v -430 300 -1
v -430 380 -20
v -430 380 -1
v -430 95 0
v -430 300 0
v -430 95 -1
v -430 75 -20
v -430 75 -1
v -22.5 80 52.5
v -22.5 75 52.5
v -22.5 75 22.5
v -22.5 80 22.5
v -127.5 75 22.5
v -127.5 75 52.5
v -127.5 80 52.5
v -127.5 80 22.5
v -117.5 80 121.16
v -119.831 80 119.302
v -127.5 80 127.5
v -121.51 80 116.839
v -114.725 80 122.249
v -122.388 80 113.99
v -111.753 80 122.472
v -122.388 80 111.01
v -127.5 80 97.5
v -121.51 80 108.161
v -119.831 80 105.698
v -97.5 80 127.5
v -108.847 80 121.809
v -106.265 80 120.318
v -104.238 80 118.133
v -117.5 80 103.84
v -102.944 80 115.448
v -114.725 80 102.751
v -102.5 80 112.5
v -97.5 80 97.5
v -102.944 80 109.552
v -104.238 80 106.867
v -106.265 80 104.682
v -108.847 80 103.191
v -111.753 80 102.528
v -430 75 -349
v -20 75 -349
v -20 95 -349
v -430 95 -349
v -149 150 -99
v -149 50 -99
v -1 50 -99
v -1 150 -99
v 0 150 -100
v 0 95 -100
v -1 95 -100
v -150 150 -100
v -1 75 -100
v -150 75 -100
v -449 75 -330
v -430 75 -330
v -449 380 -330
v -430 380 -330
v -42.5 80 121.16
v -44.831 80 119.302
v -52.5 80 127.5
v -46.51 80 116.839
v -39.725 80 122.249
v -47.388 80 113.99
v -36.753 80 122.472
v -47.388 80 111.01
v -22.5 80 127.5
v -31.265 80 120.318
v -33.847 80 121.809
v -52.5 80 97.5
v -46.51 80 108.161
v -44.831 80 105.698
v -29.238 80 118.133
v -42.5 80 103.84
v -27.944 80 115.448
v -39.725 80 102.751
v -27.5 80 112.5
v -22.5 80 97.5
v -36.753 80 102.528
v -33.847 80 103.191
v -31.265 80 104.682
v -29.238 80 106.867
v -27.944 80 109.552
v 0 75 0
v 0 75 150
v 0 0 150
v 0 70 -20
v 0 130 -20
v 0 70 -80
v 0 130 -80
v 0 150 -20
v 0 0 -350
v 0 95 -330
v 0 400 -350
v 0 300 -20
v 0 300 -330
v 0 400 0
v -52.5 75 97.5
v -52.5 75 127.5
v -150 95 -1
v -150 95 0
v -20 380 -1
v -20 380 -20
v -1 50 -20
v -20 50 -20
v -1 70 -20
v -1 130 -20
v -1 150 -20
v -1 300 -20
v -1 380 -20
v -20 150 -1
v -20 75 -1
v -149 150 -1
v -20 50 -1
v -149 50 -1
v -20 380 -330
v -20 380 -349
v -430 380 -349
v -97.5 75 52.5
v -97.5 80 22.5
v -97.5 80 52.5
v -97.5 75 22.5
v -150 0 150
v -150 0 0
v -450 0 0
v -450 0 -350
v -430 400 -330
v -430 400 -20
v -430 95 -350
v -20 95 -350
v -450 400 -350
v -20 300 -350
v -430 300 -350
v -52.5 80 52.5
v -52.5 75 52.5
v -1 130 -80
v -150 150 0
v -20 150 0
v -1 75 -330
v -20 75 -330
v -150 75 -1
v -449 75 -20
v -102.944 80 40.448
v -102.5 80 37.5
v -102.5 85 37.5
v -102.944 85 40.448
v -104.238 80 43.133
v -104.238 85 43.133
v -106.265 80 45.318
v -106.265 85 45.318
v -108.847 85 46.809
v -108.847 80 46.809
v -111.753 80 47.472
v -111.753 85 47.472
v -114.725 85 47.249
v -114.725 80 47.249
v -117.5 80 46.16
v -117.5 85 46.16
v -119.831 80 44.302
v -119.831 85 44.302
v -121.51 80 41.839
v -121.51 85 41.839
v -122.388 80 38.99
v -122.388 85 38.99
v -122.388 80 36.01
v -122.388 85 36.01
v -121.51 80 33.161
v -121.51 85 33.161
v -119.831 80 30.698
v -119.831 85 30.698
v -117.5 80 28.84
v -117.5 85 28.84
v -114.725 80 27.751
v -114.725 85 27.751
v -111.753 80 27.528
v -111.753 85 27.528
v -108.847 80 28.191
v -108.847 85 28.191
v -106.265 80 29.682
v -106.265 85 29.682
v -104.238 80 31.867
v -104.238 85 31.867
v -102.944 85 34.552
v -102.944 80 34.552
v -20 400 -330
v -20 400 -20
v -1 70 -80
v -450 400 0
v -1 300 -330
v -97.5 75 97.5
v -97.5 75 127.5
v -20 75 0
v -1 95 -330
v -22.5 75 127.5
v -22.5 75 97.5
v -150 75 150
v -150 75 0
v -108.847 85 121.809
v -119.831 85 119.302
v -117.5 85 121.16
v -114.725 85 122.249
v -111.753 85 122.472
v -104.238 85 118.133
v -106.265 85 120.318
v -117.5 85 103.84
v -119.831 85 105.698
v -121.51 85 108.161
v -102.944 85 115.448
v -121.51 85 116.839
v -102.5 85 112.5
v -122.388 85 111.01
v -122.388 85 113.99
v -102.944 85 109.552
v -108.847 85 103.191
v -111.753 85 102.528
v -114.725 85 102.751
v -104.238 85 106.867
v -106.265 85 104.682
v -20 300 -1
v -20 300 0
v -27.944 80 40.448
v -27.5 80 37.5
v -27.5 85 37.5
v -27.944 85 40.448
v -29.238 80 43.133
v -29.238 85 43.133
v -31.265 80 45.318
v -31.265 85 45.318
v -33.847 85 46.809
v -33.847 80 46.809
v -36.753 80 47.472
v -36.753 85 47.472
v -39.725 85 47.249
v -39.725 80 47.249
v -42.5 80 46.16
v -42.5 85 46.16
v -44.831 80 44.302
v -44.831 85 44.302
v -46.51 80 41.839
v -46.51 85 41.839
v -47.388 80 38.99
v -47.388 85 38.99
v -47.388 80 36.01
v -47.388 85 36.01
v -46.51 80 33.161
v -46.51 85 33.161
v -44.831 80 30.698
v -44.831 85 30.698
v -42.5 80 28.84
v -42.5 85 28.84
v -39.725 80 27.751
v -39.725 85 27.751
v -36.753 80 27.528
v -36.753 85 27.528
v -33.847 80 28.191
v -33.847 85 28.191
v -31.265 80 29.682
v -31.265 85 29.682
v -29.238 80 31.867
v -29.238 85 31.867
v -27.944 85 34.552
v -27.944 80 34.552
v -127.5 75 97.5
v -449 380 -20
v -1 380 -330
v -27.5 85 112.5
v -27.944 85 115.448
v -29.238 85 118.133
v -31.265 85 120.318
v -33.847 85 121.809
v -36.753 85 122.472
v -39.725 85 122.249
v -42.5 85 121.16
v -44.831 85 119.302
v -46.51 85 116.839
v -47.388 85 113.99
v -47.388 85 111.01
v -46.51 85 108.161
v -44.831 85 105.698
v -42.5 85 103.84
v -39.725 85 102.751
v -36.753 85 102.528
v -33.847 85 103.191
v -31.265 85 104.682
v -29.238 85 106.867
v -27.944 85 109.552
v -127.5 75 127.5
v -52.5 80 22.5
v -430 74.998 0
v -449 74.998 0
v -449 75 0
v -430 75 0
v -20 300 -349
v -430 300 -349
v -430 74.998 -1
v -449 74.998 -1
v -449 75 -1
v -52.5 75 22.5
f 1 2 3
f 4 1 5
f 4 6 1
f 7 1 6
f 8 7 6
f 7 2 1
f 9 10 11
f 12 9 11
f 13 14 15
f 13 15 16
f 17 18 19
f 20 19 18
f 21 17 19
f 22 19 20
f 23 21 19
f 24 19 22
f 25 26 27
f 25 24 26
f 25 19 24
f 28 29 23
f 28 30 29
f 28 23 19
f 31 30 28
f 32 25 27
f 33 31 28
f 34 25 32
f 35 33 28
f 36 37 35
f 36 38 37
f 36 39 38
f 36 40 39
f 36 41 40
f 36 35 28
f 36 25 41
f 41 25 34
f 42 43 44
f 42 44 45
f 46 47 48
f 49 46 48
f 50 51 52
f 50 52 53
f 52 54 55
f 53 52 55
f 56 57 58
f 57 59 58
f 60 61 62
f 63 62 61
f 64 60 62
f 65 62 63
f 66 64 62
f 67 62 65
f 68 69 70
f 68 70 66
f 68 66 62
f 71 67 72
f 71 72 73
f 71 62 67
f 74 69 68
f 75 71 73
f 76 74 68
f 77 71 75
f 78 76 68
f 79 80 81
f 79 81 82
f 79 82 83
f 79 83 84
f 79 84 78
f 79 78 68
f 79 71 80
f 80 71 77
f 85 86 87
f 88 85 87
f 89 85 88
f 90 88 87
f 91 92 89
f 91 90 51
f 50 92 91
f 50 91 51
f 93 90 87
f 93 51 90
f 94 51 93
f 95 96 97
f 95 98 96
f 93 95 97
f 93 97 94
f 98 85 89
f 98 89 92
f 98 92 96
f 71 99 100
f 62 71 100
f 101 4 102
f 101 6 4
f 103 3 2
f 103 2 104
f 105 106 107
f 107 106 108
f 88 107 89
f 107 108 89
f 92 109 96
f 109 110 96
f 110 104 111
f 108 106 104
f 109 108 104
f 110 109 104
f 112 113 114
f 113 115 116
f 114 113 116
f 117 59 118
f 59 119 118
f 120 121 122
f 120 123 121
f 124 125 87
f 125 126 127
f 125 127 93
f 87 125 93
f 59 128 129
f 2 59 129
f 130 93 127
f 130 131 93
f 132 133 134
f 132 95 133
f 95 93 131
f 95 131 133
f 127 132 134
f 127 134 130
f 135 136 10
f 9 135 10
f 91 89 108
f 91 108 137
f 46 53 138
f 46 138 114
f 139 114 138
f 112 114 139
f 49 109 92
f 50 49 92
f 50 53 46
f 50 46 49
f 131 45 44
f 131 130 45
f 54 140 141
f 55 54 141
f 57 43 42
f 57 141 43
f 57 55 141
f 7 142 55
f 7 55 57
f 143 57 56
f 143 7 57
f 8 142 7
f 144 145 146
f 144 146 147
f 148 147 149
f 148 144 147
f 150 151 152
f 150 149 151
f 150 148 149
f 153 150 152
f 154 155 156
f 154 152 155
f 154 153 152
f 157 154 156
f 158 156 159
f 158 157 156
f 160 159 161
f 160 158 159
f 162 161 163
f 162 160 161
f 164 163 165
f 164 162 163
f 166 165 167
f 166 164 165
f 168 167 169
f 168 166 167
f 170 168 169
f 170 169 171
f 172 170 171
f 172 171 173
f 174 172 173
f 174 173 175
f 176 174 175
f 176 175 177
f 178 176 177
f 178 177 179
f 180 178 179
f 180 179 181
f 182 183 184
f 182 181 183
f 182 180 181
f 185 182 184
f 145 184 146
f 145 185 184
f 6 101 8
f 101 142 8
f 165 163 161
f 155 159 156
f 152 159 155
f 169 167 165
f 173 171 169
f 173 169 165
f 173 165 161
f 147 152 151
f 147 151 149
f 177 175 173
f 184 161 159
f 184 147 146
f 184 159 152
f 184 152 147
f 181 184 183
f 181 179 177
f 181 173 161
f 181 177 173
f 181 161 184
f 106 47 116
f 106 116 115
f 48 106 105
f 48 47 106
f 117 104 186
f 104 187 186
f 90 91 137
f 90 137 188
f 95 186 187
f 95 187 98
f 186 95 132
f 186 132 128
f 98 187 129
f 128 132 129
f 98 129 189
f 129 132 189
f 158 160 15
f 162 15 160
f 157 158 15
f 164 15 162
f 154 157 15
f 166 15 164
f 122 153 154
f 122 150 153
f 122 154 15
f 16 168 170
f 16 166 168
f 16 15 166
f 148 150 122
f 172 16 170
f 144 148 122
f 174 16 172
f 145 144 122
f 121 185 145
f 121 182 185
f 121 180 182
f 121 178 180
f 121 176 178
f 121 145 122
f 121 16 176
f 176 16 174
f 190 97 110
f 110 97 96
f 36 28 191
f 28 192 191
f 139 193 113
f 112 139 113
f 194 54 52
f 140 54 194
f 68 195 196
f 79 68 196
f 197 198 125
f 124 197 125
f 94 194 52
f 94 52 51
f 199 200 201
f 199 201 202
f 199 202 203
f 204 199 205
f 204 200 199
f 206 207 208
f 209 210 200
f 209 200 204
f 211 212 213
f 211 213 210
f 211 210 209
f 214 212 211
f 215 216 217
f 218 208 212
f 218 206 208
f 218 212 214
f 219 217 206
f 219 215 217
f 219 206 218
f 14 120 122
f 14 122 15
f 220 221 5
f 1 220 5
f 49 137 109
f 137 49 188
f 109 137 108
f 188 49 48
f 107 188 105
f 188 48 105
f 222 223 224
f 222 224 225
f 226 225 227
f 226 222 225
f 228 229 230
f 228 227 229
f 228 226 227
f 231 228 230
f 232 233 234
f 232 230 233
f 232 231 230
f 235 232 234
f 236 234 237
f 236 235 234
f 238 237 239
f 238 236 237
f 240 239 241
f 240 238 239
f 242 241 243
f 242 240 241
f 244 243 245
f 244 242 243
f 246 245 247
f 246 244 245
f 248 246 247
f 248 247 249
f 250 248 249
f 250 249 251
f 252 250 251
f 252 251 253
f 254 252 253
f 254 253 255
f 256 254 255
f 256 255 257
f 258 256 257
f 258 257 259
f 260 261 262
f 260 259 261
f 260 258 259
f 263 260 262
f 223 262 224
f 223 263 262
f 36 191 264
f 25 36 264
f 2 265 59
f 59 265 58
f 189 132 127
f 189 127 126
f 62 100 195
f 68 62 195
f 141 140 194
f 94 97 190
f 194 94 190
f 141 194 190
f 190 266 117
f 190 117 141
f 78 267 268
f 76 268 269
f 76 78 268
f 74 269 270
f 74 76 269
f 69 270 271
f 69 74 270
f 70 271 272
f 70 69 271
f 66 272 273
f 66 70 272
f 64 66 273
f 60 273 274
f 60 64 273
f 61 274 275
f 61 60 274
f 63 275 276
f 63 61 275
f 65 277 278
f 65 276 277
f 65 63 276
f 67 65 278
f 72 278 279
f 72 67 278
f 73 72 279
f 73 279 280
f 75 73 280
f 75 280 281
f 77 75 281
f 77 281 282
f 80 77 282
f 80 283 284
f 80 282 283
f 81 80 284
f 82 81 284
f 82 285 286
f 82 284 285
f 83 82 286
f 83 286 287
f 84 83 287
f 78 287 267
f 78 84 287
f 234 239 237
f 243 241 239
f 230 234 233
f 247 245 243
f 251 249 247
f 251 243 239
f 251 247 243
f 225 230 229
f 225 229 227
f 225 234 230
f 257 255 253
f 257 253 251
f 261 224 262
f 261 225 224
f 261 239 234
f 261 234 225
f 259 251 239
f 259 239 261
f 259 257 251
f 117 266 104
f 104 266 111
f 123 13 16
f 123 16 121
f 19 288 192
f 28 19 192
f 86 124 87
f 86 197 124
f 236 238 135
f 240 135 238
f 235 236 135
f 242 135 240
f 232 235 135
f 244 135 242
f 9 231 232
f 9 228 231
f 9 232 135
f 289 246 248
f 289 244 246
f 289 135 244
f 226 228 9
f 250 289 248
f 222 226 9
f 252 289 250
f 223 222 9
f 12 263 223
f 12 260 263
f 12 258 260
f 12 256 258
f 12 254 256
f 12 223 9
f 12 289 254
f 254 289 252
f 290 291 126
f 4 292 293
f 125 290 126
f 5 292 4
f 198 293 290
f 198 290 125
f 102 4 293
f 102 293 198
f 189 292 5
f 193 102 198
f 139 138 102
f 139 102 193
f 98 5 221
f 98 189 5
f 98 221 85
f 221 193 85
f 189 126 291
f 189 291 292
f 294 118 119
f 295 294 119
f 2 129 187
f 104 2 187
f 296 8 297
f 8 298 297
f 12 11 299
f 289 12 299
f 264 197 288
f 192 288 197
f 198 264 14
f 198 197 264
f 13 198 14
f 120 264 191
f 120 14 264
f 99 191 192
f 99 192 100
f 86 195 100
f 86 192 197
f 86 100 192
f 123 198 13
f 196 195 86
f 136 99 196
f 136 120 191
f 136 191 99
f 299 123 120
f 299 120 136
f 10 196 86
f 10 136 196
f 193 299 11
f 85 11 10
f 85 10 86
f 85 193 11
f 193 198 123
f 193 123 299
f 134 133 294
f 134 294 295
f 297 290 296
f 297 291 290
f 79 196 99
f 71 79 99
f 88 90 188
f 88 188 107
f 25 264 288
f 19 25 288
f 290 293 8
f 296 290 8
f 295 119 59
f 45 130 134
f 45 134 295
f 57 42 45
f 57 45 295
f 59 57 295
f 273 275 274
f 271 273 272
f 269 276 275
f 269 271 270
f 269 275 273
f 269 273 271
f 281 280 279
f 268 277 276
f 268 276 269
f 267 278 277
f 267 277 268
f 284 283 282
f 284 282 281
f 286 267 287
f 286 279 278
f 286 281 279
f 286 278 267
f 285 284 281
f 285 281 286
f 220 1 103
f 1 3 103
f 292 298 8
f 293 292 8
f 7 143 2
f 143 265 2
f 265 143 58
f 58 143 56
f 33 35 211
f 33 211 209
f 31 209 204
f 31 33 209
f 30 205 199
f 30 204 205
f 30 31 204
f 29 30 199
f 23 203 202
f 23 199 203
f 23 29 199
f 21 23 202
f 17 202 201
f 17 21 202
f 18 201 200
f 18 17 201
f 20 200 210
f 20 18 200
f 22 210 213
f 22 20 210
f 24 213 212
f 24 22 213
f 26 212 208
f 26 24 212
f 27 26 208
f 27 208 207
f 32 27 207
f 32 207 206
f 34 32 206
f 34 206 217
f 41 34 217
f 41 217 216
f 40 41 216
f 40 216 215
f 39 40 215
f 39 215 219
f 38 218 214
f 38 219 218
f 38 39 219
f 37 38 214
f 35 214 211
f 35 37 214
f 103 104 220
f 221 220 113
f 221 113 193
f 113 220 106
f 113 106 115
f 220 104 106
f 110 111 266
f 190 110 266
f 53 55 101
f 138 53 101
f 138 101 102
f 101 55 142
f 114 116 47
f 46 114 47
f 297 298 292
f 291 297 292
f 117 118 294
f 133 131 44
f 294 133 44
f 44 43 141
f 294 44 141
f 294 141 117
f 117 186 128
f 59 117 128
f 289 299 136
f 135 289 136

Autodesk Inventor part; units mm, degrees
ref_plane "YZ Plane" through (0, 0, 0) normal (1, 0, 0) x (0, 1, 0)
ref_plane "XZ Plane" through (0, 0, 0) normal (0, 1, 0) x (-1, 0, 0)
ref_plane "XY Plane" through (0, 0, 0) normal (0, 0, 1) x (1, 0, 0)
sketch "Sketch1" plane through (0, 0, 0) normal (0, 1, 0) x (-1, 0, 0)
  line L0 (0, 0) -> (0, -350)
  line L1 (0, -350) -> (450, -350)
  line L2 (450, -350) -> (450, 0)
  line L3 (450, 0) -> (0, 0)
  dimension "d0" = 350
  dimension "d1" = 450
extrude "Extrusion1" add sketch "Sketch1" along normal blind 75
sketch "Sketch2" plane through (0, 75, 0) normal (0, 1, 0) x (1, 0, 0)
  line L0 (-20, 350) -> (-20, 330)
  line L1 (-20, 330) -> (0, 330)
  line L2 (0, 350) -> (-450, 350) projected
  line L3 (0, 330) -> (0, 350)
  line L4 (0, 350) -> (-20, 350)
  point P0 (0, 0)
  dimension "d4" = 20
  dimension "d5" = 20
extrude "Extrusion2" add sketch "Sketch2" along normal blind 325
sketch "Sketch3" plane through (0, 75, 0) normal (0, 1, 0) x (1, 0, 0)
  point P0 (0, 0)
sketch "Sketch4" plane through (0, 75, 0) normal (0, 1, 0) x (1, 0, 0)
  line L0 (-20, 350) -> (-20, 330) projected
  line L1 (-20, 350) -> (-20, 349)
  line L2 (-20, 349) -> (-450, 349)
  line L3 (-450, 349) -> (-450, 350)
  line L4 (-450, 350) -> (-20, 350)
  line L5 (-20, 350) -> (-20, 349)
  line L6 (0, 0) -> (0, 350) projected
  line L7 (-20, 349) -> (-20, 350)
  line L8 (-20, 350) -> (-20, 349)
  dimension "d9" = 430
  dimension "d10" = 1
  dimension "d11" = 430
  dimension "d12" = 1
extrude "Extrusion3" add sketch "Sketch4" along normal blind 20
sketch "Sketch5" plane through (0, 75, 0) normal (0, 1, 0) x (1, 0, 0)
  line L0 (-450, 350) -> (-450, 0) projected
  line L1 (-450, 350) -> (-449, 350)
  line L2 (-20, 350) -> (-450, 350) projected
  line L3 (-449, 350) -> (-449, 0)
  line L4 (-450, 0) -> (0, 0) projected
  line L5 (-449, 0) -> (-450, 0)
  line L6 (-450, 0) -> (-450, 350)
  line L7 (-20, 349) -> (-450, 349) projected
  line L8 (-449, 349) -> (-449, 350)
  line L9 (-450, 350) -> (-449, 350)
  dimension "d15" = 1
extrude "Extrusion4" add sketch "Sketch5" along normal blind 325 contours L7 L3 L4 L0
sketch "Sketch6" plane through (0, 95, 0) normal (0, 1, 0) x (1, 0, 0)
  line L0 (-449, 349) -> (-449, 0) projected
  line L1 (-449, 349) -> (-449, 350)
  line L2 (-20, 350) -> (-450, 350) projected
  line L3 (-450, 350) -> (-450, 0) projected
  line L4 (-449, 350) -> (-450, 350)
  line L5 (-450, 350) -> (-450, 349)
  line L6 (-450, 349) -> (-449, 349) projected
  line L7 (-450, 349) -> (-449, 349)
  line L8 (-449, 349) -> (-449, 350)
  point P0 (0, 0)
extrude "Extrusion5" add sketch "Sketch6" along normal blind 305
sketch "Sketch7" plane through (0, 75, 0) normal (0, 1, 0) x (1, 0, 0)
  line L0 (0, 0) -> (0, 350) projected
  line L1 (0, 0) -> (0, 20)
  line L2 (0, 20) -> (-20, 20)
  line L3 (-20, 20) -> (-20, 0)
  line L4 (-20, 0) -> (0, 0)
  dimension "d20" = 20
  dimension "d21" = 20
extrude "Extrusion6" add sketch "Sketch7" along normal blind 325
sketch "Sketch8" plane through (0, 75, 0) normal (0, 1, 0) x (1, 0, 0)
  line L0 (0, 20) -> (-20, 20) projected
  line L1 (0, 20) -> (0, 100)
  line L2 (0, 20) -> (0, 330) projected
  line L3 (0, 100) -> (-1, 100)
  line L4 (-1, 100) -> (-1, 20)
  line L5 (-1, 20) -> (0, 20)
  point P0 (0, 0)
  dimension "d24" = 80
  dimension "d25" = 1
  dimension "d26" = 80
extrude "Extrusion7" add sketch "Sketch8" along normal blind 75
sketch "Sketch9" plane through (0, 75, 0) normal (0, 1, 0) x (1, 0, 0)
  line L0 (-1, 100) -> (0, 100) projected
  line L1 (-1, 100) -> (-149, 100)
  line L2 (-149, 100) -> (-149, 99)
  line L3 (-149, 99) -> (-1, 99)
  line L4 (-1, 100) -> (-1, 20) projected
  line L5 (-1, 99) -> (-1, 100)
  point P0 (0, 0)
  dimension "d29" = 148
  dimension "d32" = 1
  dimension "d33" = 148
extrude "Extrusion8" add sketch "Sketch9" along normal blind 75
sketch "Sketch10" plane through (0, 75, 0) normal (0, 1, 0) x (1, 0, 0)
  line L0 (-149, 99) -> (-149, 100) projected
  line L1 (-149, 100) -> (-150, 100)
  line L2 (-150, 100) -> (-150, 0)
  line L3 (-150, 0) -> (-149, 0)
  line L4 (-449, 0) -> (-20, 0) projected
  line L5 (-149, 0) -> (-149, 100)
  point P0 (0, 0)
  dimension "d36" = 1
  dimension "d37" = 100
  dimension "d38" = 1
  dimension "d39" = 100
extrude "Extrusion9" add sketch "Sketch10" along normal blind 75
sketch "Sketch11" plane through (0, 75, 0) normal (0, 1, 0) x (1, 0, 0)
  line L0 (-450, 0) -> (0, 0) projected
  line L1 (-149.0001, 0) -> (-20.0001, 0)
  line L2 (-20.0001, 0) -> (-20.0001, 1)
  line L3 (-20.0001, 1) -> (-149.0001, 1)
  line L4 (-149.0001, 1) -> (-149.0001, 0)
  dimension "d42" = 129
  dimension "d43" = 1
  dimension "d44" = 129
extrude "Extrusion10" add sketch "Sketch11" along normal blind 75
sketch "Sketch12" plane through (0, 75, 0) normal (0, 1, 0) x (1, 0, 0)
  point P0 (0, 0)
sketch "Sketch13" plane through (0, 75, 0) normal (0, 1, 0) x (1, 0, 0)
  line L0 (-149, 1) -> (-149, 99) projected
  line L1 (-1, 20) -> (-1, 99) projected
  line L2 (-149, 99) -> (-1, 99)
  line L3 (-1, 99) -> (-1, 20)
  line L4 (0, 20) -> (-20, 20) projected
  line L5 (-1, 20) -> (-20, 20)
  line L6 (-20, 20) -> (-20, 1)
  line L7 (-20, 0) -> (0, 0) projected
  line L8 (-20, 1) -> (-149, 1)
  line L9 (-149, 1) -> (-149, 99)
extrude "Extrusion11" cut sketch "Sketch13" against normal blind 25
sketch "Sketch14" plane through (0, 75, 0) normal (0, 1, 0) x (1, 0, 0)
  line L0 (0, 100) -> (0, 330) projected
  line L1 (0, 330) -> (0, 100)
  line L2 (0, 100) -> (-1, 100)
  line L3 (-150, 100) -> (0, 100) projected
  line L4 (0, 100) -> (1, 100) construction
  line L5 (-1, 100) -> (-1, 330)
  line L6 (-1, 330) -> (0, 330)
  point P0 (0, 0)
  dimension "d49" = 1
  dimension "d50" = 180
  dimension "d51" = 230
  dimension "d52" = 90
extrude "Extrusion12" add sketch "Sketch14" along normal blind 20
sketch "Sketch15" plane through (0, 75, 0) normal (0, 1, 0) x (1, 0, 0)
  line L0 (-449, 0) -> (-449, 350) projected
  line L1 (-150, 100) -> (-150, 0) projected
  line L2 (-449, 0) -> (-150, 0)
  line L3 (-150, 0) -> (-150, 1)
  line L4 (-150, 1) -> (-449, 1)
  line L5 (-449, 1) -> (-449, 0)
  point P0 (0, 0)
  dimension "d55" = 1
  dimension "d56" = 90
extrude "Extrusion13" add sketch "Sketch15" along normal blind 20
sketch "Sketch16" plane through (0, 400, 0) normal (0, 1, 0) x (1, 0, 0)
  line L0 (-450, 350) -> (-450, 0) projected
  line L1 (-449, 0) -> (-449, 350) projected
  line L2 (-450, 350) -> (-449, 350)
  line L3 (-449, 350) -> (-449, 330)
  line L4 (-449, 330) -> (-450, 330)
  line L5 (-450, 330) -> (-450, 350)
  point P0 (0, 0)
  dimension "d59" = 20
  dimension "d60" = 20
extrude "Extrusion14" cut sketch "Sketch16" against normal blind 325
sketch "Sketch17" plane through (-449, 75, -349) normal (-1, 0, 0) x (0, 0, 1)
  line L0 (-1, 0) -> (-1, 20) projected
  line L1 (-1, 20) -> (-1, 0)
  line L2 (-1, 0) -> (0, 0)
  line L3 (0, 0) -> (0, 20)
  line L4 (0, 20) -> (-1, 20)
  point P0 (349, -75)
  dimension "d63" = 1
extrude "Extrusion15" cut sketch "Sketch17" against normal blind 19
sketch "Sketch18" plane through (0, 75, 0) normal (0, 1, 0) x (1, 0, 0)
  line L0 (-450, 350) -> (-430, 350) projected
  line L1 (-450, 350) -> (-430, 350)
  line L2 (-430, 350) -> (-430, 330)
  line L3 (-430, 330) -> (-450, 330)
  line L4 (-450, 330) -> (-450, 350)
  point P0 (0, 0)
  dimension "d66" = 20
extrude "Extrusion16" add sketch "Sketch18" along normal blind 325
sketch "Sketch19" plane through (0, 400, 0) normal (0, 1, 0) x (1, 0, 0)
  line L0 (-449, 0) -> (-449, 1) projected
  line L1 (-450, 0) -> (0, 0) projected
  line L2 (-449, 0) -> (-450, 0)
  line L3 (-450, 0) -> (-450, 20)
  line L4 (-450, 20) -> (-449, 20)
  line L5 (-449, 20) -> (-449, 0)
  dimension "d69" = 20
extrude "Extrusion17" cut sketch "Sketch19" against normal blind 325
sketch "Sketch20" plane through (-449, 75, -1) normal (-1, 0, 0) x (0, 0, 1)
  line L0 (0, 19.9976) -> (1, 19.9976)
  line L1 (1, 19.9976) -> (1, -0.0024)
  line L2 (1, -0.0024) -> (0, -0.0024)
  line L3 (0, 19.9976) -> (0, -0.0024)
  point P0 (1, -75)
  dimension "d72" = 20
extrude "Extrusion18" cut sketch "Sketch20" against normal blind 19
sketch "Sketch21" plane through (0, 95, 0) normal (0, 1, 0) x (1, 0, 0)
  line L0 (-150, 1) -> (-449, 1) projected
  line L1 (-449, 1) -> (-449, 0)
  line L2 (-449, 0) -> (-430, 0)
  line L3 (-430, 0) -> (-430, 1)
  line L4 (-430, 1) -> (-449, 1)
  point P0 (0, 0)
  dimension "d75" = 1
  dimension "d76" = 19
  dimension "d77" = 1
extrude "Extrusion19" cut sketch "Sketch21" against normal blind 0.1
sketch "Sketch22" plane through (0, 75, 0) normal (0, 1, 0) x (1, 0, 0)
  line L0 (-450, 350) -> (-450, 0) projected
  line L1 (-450, 0) -> (-450, 20)
  line L2 (-450, 20) -> (-430, 20)
  line L3 (-430, 20) -> (-430, 0)
  line L4 (-430, 0) -> (-450, 0)
  point P0 (0, 0)
  dimension "d80" = 20
  dimension "d81" = 20
extrude "Extrusion20" add sketch "Sketch22" along normal blind 325
sketch "Sketch23" plane through (-450, 0, 0) normal (0, 0, 1) x (1, 0, 0)
  line L0 (20, 75) -> (300, 75) projected
  line L1 (300, 75) -> (450, 75)
  line L2 (450, 0) -> (450, 400) projected
  line L3 (450, 75) -> (450, 0)
  line L4 (449, 150) -> (449, 50) projected
  line L5 (0, 0) -> (450, 0) projected
  line L6 (450, 0) -> (300, 0)
  line L7 (300, 75) -> (300, 0)
extrude "Extrusion21" add sketch "Sketch23" along normal blind 150
sketch "Sketch24" plane through (0, 75, 0) normal (0, 1, 0) x (1, 0, 0)
  line L0 (0, 0) -> (0, -150) projected
  line L1 (0, -75) -> (-150, -75)
  line L2 (-150, 0) -> (-150, -150) projected
  line L3 (0, -150) -> (-150, -150) projected
  line L4 (-75, -150) -> (-75, 0)
  line L5 (-127.5, -22.5) -> (-97.5, -22.5)
  line L6 (-97.5, -22.5) -> (-97.5, -52.5)
  line L7 (-97.5, -52.5) -> (-127.5, -52.5)
  line L8 (-127.5, -52.5) -> (-127.5, -22.5)
  line L9 (-127.5, -22.5) -> (-97.5, -52.5) construction
  line L10 (-97.5, -22.5) -> (-127.5, -52.5) construction
  line L11 (-52.5, -52.5) -> (-22.5, -52.5)
  line L12 (-22.5, -52.5) -> (-22.5, -22.5)
  line L13 (-22.5, -22.5) -> (-52.5, -22.5)
  line L14 (-52.5, -22.5) -> (-52.5, -52.5)
  line L15 (-52.5, -52.5) -> (-22.5, -22.5) construction
  line L16 (-22.5, -52.5) -> (-52.5, -22.5) construction
  line L17 (-52.5, -127.5) -> (-22.5, -127.5)
  line L18 (-22.5, -127.5) -> (-22.5, -97.5)
  line L19 (-22.5, -97.5) -> (-52.5, -97.5)
  line L20 (-52.5, -97.5) -> (-52.5, -127.5)
  line L21 (-52.5, -127.5) -> (-22.5, -97.5) construction
  line L22 (-22.5, -127.5) -> (-52.5, -97.5) construction
  line L23 (-127.5, -127.5) -> (-97.5, -127.5)
  line L24 (-97.5, -127.5) -> (-97.5, -97.5)
  line L25 (-97.5, -97.5) -> (-127.5, -97.5)
  line L26 (-127.5, -97.5) -> (-127.5, -127.5)
  line L27 (-127.5, -127.5) -> (-97.5, -97.5) construction
  line L28 (-97.5, -127.5) -> (-127.5, -97.5) construction
  dimension "d86" = 30
  dimension "d87" = 30
  dimension "d88" = 30
extrude "Extrusion22" add sketch "Sketch24" along normal blind 5 contours L5 L6 L7 L8 | L14 L13 L12 L11 | L20 L19 L18 L17 | L26 L25 L24 L23
sketch "Sketch25" plane through (0, 75, 0) normal (0, 1, 0) x (1, 0, 0)
  circle A0 centre (-37.5, -112.5) radius 10
  point P0 (0, 0)
  dimension "d91" = 20
extrude "Extrusion23" add sketch "Sketch25" along normal blind 10
sketch "Sketch26" plane through (0, 80, 0) normal (0, 1, 0) x (1, 0, 0)
  circle A0 centre (-112.5, -112.5) radius 10
  point P0 (0, 0)
  dimension "d94" = 20
extrude "Extrusion24" add sketch "Sketch26" along normal blind 5
sketch "Sketch27" plane through (0, 80, 0) normal (0, 1, 0) x (1, 0, 0)
  circle A0 centre (-112.5, -37.5) radius 10
  point P0 (0, 0)
  dimension "d97" = 20
extrude "Extrusion25" add sketch "Sketch27" along normal blind 5
sketch "Sketch28" plane through (0, 80, 0) normal (0, 1, 0) x (1, 0, 0)
  circle A0 centre (-37.5, -37.5) radius 10
  point P0 (0, 0)
  dimension "d100" = 20
extrude "Extrusion26" add sketch "Sketch28" along normal blind 5
sketch "Sketch29" plane through (0, 0, -350) normal (0, 0, -1) x (-1, 0, 0)
  line L0 (20, 75) -> (20, 400) projected
  line L1 (430, 95) -> (430, 400) projected
  line L2 (20, 400) -> (430, 400)
  line L3 (430, 400) -> (430, 380)
  line L4 (430, 380) -> (20, 380)
  line L5 (20, 380) -> (20, 400)
  point P0 (0, 0)
  dimension "d103" = 20
extrude "Extrusion27" add sketch "Sketch29" against normal blind 20
sketch "Sketch30" plane through (-450, 0, 0) normal (0, 0, 1) x (1, 0, 0)
  line L0 (20, 380) -> (430, 380) projected
  line L1 (430, 75) -> (430, 380) projected
  line L2 (20, 380) -> (430, 380)
  line L3 (430, 380) -> (430, 400)
  line L4 (430, 400) -> (20, 400)
  line L5 (20, 400) -> (20, 380)
  point P0 (450, 0)
  dimension "d106" = 20
  dimension "d107" = 20
extrude "Extrusion28" add sketch "Sketch30" against normal blind 20
sketch "Sketch31" plane through (0, 0, -350) normal (1, 0, 0) x (0, 0, -1)
  line L0 (-330, 400) -> (-330, 75) projected
  line L1 (-20, 95) -> (-20, 400) projected
  line L2 (-330, 400) -> (-20, 400)
  line L3 (0, 380) -> (-20, 380) projected
  line L4 (-20, 400) -> (-20, 380)
  line L5 (-20, 380) -> (-330, 380)
  line L6 (-350, 0) -> (-350, 400) projected
  line L7 (-330, 380) -> (-330, 400)
  dimension "d110" = 20
extrude "Extrusion29" add sketch "Sketch31" against normal blind 20
sketch "Sketch32" plane through (0, 400, 0) normal (0, 1, 0) x (1, 0, 0)
  line L0 (-449, 20) -> (-430, 20) projected
  line L1 (-449, 20) -> (-450, 20)
  line L2 (-450, 350) -> (-450, 0) projected
  line L3 (-449, 20) -> (-449, 330) projected
  line L4 (-449, 330) -> (-450, 330)
  point P0 (0, 0)
extrude "Extrusion30" cut sketch "Sketch32" against normal blind 20
sketch "Sketch33" plane through (-450, 0, -350) normal (-1, 0, 0) x (0, 0, 1)
  point P0 (350, 0)
sketch "Sketch34" plane through (-450, 0, -350) normal (-1, 0, 0) x (0, 0, 1)
  line L0 (330, 380) -> (20, 380) projected
  line L1 (20, 380) -> (20, 400)
  line L2 (20, 400) -> (330, 400)
  line L3 (330, 400) -> (330, 380)
  line L4 (20, 380) -> (330, 380)
  point P0 (350, 0)
  dimension "d115" = 20
extrude "Extrusion31" add sketch "Sketch34" against normal blind 20
sketch "Sketch35" plane through (0, 0, -350) normal (0, 0, -1) x (-1, 0, 0)
  line L0 (20, 380) -> (430, 380) projected
  line L1 (20, 380) -> (20, 300)
  line L2 (20, 75) -> (20, 380) projected
  line L3 (20, 300) -> (430, 300)
  line L4 (430, 75) -> (430, 380) projected
  point P0 (0, 0)
  dimension "d118" = 80
extrude "Extrusion32" add sketch "Sketch35" against normal blind 1
sketch "Sketch36" plane through (0, 0, -350) normal (1, 0, 0) x (0, 0, -1)
  line L0 (-330, 380) -> (-20, 380) projected
  line L1 (-20, 380) -> (-20, 300)
  line L2 (-20, 75) -> (-20, 380) projected
  line L3 (-20, 300) -> (-330, 300)
  line L4 (-330, 380) -> (-330, 75) projected
  point P0 (-350, 0)
  dimension "d121" = 80
extrude "Extrusion33" add sketch "Sketch36" against normal blind 1
sketch "Sketch37" plane through (-450, 400, 0) normal (0, 0, 1) x (1, 0, 0)
  line L0 (20, -20) -> (1, -20) projected
  line L1 (430, -100) -> (20, -100) projected
  line L2 (20, -20) -> (20, -100)
  line L3 (20, -100) -> (430, -100)
  line L4 (430, -100) -> (430, -20)
  line L5 (430, -20) -> (20, -20)
  point P0 (450, -400)
  dimension "d124" = 80
  dimension "d125" = 410
  dimension "d126" = 80
  dimension "d127" = 410
extrude "Extrusion34" add sketch "Sketch37" against normal blind 1
sketch "Sketch38" plane through (0, 0, -350) normal (1, 0, 0) x (0, 0, -1)
  line L0 (-330, 130) -> (-270, 130)
  line L1 (-270, 130) -> (-270, 70)
  line L2 (-270, 70) -> (-330, 70)
  line L3 (-330, 70) -> (-330, 130)
  point P0 (-350, 0)
  point P1 (-330, 150)
  dimension "d131" = 60
  dimension "d132" = 60
  dimension "d133" = 60
extrude "Extrusion35" cut sketch "Sketch38" against normal blind 1
properties part number "Project frame"
